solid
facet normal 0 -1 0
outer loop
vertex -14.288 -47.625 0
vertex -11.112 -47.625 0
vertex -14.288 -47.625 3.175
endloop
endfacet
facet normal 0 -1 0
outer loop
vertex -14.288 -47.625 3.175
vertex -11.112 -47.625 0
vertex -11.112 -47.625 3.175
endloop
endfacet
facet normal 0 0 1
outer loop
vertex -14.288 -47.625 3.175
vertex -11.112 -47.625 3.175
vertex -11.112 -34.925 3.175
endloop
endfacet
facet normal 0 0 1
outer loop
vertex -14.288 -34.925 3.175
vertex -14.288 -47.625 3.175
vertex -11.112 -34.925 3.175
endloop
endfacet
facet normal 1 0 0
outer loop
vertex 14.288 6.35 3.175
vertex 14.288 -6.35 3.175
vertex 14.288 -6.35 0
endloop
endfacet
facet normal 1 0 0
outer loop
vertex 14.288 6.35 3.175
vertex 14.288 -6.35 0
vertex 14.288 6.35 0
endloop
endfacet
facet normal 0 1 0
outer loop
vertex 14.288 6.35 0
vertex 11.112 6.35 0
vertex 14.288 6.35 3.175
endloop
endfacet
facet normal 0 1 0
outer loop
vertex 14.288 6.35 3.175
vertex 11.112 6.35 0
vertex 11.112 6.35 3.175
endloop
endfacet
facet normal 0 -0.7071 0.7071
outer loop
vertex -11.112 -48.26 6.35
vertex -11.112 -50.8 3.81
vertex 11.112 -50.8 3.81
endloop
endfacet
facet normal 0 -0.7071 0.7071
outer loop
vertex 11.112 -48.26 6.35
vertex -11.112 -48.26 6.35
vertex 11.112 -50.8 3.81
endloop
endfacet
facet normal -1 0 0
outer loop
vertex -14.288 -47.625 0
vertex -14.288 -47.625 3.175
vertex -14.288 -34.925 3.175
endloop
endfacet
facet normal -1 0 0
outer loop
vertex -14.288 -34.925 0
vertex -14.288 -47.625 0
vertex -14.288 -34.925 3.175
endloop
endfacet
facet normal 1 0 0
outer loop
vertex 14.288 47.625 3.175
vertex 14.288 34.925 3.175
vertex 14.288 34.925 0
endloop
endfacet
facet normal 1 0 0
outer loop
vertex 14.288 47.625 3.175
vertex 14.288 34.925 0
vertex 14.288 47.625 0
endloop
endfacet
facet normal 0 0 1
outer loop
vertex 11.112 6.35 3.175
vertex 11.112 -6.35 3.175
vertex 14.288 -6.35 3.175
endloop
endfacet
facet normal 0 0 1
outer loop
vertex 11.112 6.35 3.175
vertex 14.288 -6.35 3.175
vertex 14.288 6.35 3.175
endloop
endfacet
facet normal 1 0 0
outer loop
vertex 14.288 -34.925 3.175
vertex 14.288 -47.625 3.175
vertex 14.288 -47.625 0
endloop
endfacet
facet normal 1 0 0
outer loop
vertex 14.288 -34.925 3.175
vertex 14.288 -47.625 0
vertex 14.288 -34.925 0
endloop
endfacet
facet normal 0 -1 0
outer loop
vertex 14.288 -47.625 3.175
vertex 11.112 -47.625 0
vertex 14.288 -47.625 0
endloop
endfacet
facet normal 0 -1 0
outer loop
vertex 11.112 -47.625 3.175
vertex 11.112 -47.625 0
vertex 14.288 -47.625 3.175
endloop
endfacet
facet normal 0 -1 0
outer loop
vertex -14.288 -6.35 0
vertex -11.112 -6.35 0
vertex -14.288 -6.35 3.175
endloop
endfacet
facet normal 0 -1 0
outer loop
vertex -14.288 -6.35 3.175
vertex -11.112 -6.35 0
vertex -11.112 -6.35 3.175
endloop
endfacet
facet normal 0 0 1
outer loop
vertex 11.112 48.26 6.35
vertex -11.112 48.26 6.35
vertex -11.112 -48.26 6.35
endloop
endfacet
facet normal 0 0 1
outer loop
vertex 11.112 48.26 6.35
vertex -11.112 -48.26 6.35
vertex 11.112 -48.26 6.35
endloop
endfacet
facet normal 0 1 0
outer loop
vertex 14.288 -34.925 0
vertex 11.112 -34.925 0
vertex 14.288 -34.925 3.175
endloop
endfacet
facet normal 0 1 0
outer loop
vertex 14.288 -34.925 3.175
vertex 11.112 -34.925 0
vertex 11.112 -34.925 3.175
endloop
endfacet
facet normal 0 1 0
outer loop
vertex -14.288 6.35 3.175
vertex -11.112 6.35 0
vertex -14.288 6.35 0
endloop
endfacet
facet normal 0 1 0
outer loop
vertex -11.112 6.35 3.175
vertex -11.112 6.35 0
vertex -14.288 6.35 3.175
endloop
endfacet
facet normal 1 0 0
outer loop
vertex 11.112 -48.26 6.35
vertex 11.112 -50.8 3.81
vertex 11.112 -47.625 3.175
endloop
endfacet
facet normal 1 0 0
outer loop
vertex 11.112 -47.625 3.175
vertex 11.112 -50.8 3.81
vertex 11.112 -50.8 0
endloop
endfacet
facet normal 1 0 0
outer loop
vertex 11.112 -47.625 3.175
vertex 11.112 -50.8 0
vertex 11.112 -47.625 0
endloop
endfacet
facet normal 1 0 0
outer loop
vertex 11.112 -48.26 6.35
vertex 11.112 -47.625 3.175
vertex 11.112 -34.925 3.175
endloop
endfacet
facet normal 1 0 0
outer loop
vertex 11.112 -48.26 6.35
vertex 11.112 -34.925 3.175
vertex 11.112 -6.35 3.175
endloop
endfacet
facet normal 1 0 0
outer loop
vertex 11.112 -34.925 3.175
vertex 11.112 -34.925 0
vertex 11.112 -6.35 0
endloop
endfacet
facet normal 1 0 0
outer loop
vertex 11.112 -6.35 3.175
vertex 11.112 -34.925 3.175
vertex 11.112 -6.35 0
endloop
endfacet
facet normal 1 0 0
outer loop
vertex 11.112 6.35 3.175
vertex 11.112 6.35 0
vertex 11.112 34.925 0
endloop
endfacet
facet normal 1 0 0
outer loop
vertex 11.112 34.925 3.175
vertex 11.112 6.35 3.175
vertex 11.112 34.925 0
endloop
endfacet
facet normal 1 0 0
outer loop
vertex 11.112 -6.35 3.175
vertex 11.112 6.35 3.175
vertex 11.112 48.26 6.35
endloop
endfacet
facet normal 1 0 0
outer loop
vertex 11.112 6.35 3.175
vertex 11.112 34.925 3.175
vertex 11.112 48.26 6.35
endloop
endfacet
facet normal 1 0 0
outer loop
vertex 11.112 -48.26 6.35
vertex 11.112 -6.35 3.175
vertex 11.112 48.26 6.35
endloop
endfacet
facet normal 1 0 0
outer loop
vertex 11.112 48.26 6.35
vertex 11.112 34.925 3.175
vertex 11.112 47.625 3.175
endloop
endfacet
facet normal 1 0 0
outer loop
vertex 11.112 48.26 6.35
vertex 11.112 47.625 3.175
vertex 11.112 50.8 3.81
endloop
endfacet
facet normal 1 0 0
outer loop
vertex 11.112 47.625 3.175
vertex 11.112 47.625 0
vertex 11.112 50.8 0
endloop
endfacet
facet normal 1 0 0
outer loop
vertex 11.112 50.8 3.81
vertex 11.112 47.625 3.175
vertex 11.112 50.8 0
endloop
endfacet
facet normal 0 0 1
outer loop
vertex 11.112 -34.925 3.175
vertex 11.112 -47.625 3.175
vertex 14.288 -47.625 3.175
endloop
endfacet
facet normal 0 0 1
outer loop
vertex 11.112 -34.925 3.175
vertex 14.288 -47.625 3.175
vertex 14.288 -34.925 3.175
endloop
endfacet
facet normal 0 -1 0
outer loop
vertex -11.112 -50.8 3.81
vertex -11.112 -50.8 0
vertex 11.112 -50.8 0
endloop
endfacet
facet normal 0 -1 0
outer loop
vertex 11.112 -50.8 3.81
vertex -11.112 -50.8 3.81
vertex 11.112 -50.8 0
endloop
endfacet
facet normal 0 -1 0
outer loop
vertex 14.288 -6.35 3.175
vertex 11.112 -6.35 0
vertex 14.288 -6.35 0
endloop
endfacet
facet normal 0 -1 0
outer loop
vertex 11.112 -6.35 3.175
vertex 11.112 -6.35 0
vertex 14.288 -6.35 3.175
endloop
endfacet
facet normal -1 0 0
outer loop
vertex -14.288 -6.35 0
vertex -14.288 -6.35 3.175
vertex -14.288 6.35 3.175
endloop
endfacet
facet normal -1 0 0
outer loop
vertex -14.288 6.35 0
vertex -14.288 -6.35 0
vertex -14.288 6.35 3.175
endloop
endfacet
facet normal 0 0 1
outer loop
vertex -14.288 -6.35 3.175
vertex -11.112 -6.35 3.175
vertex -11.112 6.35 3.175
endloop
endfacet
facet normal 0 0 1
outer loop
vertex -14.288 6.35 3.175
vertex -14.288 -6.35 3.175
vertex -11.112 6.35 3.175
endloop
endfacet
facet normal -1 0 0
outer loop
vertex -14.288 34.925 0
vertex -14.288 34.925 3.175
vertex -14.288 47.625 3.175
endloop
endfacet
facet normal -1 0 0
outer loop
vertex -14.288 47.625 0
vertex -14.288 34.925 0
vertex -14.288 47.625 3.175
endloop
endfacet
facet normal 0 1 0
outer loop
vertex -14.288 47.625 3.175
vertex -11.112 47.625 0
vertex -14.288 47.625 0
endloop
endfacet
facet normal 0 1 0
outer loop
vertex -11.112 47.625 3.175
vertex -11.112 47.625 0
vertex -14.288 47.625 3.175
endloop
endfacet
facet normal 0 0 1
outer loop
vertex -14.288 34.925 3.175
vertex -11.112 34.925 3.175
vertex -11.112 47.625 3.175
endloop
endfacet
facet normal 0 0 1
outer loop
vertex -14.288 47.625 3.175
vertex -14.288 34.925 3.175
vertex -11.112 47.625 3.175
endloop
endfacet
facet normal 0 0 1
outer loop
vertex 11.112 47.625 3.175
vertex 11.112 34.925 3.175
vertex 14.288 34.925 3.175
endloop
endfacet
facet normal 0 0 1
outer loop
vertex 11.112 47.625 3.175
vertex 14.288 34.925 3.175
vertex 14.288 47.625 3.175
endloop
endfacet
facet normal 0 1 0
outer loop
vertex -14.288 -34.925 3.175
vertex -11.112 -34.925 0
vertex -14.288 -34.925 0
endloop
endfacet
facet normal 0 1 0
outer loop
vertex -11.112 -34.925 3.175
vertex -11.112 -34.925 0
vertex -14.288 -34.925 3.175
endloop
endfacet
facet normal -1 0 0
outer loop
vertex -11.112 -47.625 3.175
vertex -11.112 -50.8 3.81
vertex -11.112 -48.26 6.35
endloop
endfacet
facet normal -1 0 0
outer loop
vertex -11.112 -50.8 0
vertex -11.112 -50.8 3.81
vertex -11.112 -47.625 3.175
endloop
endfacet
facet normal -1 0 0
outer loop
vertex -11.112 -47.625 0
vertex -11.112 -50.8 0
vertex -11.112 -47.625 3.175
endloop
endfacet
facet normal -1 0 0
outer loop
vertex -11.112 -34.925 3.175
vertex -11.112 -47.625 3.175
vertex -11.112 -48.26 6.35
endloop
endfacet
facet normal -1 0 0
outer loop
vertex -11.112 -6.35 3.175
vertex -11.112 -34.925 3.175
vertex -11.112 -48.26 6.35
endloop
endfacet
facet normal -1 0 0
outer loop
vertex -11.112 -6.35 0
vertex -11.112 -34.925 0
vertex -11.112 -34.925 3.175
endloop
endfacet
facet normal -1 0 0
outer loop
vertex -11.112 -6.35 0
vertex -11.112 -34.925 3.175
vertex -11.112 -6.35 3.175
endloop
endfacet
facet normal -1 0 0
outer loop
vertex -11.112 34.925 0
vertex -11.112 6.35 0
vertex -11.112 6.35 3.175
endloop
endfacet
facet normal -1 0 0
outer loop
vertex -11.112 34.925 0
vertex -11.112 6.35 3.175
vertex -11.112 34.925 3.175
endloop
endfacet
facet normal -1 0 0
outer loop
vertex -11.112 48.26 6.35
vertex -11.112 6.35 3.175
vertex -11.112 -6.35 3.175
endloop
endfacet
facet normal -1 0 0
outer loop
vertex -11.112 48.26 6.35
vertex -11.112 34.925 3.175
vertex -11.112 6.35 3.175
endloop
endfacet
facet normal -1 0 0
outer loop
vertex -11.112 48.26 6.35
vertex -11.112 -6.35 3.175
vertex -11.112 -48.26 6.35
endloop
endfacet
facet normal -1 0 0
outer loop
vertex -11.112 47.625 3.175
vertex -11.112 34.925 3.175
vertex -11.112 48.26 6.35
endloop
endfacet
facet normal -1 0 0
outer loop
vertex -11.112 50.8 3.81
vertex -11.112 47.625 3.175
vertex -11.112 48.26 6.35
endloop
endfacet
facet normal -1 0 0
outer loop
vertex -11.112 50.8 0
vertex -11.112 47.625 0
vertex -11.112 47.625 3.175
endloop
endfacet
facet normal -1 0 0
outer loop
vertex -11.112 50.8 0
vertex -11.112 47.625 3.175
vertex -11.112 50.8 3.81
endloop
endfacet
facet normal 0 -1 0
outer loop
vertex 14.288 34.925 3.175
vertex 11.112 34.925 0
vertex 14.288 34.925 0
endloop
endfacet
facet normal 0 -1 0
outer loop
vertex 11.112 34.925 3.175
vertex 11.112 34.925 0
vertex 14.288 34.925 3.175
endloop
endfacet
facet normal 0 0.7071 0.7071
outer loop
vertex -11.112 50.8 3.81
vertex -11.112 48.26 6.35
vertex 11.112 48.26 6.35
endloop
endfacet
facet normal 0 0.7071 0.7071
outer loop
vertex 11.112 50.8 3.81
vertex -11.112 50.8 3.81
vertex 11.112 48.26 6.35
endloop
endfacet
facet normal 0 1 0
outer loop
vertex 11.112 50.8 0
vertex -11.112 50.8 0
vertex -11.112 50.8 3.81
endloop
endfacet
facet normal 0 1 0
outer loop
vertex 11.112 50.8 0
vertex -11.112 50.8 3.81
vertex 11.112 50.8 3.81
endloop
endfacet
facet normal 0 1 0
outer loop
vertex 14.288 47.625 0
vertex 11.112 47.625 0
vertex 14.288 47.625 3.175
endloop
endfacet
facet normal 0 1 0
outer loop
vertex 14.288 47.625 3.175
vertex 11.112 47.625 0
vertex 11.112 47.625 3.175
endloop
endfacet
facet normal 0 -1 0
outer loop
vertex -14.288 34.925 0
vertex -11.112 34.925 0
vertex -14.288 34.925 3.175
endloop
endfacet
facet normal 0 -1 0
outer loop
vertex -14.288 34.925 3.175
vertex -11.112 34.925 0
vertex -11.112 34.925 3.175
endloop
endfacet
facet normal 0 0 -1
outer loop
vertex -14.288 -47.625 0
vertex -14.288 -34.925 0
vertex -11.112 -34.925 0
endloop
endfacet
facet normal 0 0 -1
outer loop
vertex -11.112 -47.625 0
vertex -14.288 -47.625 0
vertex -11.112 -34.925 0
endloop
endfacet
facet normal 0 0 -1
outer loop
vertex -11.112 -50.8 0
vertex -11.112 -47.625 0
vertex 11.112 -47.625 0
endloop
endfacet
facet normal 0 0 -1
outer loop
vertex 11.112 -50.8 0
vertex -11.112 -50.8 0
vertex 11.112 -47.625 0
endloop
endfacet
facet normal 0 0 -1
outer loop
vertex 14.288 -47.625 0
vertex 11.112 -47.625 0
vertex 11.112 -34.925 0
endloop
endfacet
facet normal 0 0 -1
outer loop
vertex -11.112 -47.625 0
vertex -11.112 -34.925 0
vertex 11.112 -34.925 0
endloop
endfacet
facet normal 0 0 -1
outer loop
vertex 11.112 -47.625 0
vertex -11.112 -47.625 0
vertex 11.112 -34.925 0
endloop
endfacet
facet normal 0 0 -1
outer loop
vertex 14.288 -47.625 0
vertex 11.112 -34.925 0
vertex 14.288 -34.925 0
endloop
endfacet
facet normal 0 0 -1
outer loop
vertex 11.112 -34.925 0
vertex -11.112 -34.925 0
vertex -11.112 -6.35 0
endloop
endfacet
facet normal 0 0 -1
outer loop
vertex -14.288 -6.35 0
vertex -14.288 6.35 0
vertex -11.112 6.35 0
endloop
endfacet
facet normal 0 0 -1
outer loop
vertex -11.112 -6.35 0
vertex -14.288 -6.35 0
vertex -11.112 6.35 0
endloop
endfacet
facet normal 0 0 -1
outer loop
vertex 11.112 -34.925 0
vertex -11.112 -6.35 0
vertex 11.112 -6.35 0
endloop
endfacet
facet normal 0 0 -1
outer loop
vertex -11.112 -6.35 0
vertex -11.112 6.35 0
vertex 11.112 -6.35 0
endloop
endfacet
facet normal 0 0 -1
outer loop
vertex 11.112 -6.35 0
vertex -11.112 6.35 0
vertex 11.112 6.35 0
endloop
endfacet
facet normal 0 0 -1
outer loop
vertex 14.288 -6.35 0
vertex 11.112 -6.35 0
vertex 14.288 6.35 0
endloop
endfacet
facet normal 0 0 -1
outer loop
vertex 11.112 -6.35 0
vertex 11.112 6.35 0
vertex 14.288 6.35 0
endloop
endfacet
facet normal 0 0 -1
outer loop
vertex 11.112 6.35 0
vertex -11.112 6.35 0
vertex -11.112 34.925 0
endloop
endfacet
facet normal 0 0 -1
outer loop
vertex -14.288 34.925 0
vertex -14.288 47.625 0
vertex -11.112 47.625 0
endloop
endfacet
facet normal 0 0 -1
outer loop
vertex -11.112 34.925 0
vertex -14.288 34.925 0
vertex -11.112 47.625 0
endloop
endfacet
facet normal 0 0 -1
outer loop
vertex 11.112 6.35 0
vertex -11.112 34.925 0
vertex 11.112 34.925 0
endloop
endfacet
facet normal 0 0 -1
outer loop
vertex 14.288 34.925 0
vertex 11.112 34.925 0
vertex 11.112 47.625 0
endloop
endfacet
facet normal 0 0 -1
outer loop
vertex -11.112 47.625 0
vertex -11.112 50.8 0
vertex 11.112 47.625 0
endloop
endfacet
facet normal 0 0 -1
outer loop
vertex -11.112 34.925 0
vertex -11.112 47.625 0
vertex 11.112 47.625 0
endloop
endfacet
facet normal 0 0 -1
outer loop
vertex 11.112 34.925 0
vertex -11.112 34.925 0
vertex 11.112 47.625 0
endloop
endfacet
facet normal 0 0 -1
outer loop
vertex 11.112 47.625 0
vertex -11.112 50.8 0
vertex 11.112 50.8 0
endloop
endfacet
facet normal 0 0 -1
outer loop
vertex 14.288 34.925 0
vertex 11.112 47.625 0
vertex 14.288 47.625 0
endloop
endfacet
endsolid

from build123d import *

# Parameters (mm, degrees)
F0_W     = 22.225
F0_H     = 101.6
F1_DEPTH = 6.35
F2_W     = 12.7
F2_H     = 3.175
F3_DEPTH = 3.175
F4_SIZE  = 2.54


# Not quite as in the source:
# - a pattern or mirror of a feature is missing from the dataset's text; its kind, count and spacing are read off the source's solid


with BuildPart() as f1:
    # F0 (on Top) → F1 (new body)
    with BuildSketch(Plane.XY):
        Rectangle(F0_W, F0_H)
    extrude(amount=F1_DEPTH)

    # F2 (on face) → F3 (join)
    with BuildSketch(Plane.YZ.offset(11.1125)):
        with Locations((-41.275, 1.5875)):
            Rectangle(F2_W, F2_H)
        with Locations((0, 1.5875)):
            Rectangle(F2_W, F2_H)
        with Locations((41.275, 1.5875)):
            Rectangle(F2_W, F2_H)
    f3 = extrude(amount=F3_DEPTH)

    # F3_copies: F3 across plane
    add(f3.mirror(Plane(origin=(0, 0, 0), x_dir=(0, 0, -1), z_dir=(-1, 0, 0))))

    # F4
    f4_edges = [f1.edges().sort_by_distance(p)[0] for p in [
        (0, 50.8, 6.35),
        (0, -50.8, 6.35),
    ]]
    chamfer(f4_edges, length=F4_SIZE)


solid = f1.part
